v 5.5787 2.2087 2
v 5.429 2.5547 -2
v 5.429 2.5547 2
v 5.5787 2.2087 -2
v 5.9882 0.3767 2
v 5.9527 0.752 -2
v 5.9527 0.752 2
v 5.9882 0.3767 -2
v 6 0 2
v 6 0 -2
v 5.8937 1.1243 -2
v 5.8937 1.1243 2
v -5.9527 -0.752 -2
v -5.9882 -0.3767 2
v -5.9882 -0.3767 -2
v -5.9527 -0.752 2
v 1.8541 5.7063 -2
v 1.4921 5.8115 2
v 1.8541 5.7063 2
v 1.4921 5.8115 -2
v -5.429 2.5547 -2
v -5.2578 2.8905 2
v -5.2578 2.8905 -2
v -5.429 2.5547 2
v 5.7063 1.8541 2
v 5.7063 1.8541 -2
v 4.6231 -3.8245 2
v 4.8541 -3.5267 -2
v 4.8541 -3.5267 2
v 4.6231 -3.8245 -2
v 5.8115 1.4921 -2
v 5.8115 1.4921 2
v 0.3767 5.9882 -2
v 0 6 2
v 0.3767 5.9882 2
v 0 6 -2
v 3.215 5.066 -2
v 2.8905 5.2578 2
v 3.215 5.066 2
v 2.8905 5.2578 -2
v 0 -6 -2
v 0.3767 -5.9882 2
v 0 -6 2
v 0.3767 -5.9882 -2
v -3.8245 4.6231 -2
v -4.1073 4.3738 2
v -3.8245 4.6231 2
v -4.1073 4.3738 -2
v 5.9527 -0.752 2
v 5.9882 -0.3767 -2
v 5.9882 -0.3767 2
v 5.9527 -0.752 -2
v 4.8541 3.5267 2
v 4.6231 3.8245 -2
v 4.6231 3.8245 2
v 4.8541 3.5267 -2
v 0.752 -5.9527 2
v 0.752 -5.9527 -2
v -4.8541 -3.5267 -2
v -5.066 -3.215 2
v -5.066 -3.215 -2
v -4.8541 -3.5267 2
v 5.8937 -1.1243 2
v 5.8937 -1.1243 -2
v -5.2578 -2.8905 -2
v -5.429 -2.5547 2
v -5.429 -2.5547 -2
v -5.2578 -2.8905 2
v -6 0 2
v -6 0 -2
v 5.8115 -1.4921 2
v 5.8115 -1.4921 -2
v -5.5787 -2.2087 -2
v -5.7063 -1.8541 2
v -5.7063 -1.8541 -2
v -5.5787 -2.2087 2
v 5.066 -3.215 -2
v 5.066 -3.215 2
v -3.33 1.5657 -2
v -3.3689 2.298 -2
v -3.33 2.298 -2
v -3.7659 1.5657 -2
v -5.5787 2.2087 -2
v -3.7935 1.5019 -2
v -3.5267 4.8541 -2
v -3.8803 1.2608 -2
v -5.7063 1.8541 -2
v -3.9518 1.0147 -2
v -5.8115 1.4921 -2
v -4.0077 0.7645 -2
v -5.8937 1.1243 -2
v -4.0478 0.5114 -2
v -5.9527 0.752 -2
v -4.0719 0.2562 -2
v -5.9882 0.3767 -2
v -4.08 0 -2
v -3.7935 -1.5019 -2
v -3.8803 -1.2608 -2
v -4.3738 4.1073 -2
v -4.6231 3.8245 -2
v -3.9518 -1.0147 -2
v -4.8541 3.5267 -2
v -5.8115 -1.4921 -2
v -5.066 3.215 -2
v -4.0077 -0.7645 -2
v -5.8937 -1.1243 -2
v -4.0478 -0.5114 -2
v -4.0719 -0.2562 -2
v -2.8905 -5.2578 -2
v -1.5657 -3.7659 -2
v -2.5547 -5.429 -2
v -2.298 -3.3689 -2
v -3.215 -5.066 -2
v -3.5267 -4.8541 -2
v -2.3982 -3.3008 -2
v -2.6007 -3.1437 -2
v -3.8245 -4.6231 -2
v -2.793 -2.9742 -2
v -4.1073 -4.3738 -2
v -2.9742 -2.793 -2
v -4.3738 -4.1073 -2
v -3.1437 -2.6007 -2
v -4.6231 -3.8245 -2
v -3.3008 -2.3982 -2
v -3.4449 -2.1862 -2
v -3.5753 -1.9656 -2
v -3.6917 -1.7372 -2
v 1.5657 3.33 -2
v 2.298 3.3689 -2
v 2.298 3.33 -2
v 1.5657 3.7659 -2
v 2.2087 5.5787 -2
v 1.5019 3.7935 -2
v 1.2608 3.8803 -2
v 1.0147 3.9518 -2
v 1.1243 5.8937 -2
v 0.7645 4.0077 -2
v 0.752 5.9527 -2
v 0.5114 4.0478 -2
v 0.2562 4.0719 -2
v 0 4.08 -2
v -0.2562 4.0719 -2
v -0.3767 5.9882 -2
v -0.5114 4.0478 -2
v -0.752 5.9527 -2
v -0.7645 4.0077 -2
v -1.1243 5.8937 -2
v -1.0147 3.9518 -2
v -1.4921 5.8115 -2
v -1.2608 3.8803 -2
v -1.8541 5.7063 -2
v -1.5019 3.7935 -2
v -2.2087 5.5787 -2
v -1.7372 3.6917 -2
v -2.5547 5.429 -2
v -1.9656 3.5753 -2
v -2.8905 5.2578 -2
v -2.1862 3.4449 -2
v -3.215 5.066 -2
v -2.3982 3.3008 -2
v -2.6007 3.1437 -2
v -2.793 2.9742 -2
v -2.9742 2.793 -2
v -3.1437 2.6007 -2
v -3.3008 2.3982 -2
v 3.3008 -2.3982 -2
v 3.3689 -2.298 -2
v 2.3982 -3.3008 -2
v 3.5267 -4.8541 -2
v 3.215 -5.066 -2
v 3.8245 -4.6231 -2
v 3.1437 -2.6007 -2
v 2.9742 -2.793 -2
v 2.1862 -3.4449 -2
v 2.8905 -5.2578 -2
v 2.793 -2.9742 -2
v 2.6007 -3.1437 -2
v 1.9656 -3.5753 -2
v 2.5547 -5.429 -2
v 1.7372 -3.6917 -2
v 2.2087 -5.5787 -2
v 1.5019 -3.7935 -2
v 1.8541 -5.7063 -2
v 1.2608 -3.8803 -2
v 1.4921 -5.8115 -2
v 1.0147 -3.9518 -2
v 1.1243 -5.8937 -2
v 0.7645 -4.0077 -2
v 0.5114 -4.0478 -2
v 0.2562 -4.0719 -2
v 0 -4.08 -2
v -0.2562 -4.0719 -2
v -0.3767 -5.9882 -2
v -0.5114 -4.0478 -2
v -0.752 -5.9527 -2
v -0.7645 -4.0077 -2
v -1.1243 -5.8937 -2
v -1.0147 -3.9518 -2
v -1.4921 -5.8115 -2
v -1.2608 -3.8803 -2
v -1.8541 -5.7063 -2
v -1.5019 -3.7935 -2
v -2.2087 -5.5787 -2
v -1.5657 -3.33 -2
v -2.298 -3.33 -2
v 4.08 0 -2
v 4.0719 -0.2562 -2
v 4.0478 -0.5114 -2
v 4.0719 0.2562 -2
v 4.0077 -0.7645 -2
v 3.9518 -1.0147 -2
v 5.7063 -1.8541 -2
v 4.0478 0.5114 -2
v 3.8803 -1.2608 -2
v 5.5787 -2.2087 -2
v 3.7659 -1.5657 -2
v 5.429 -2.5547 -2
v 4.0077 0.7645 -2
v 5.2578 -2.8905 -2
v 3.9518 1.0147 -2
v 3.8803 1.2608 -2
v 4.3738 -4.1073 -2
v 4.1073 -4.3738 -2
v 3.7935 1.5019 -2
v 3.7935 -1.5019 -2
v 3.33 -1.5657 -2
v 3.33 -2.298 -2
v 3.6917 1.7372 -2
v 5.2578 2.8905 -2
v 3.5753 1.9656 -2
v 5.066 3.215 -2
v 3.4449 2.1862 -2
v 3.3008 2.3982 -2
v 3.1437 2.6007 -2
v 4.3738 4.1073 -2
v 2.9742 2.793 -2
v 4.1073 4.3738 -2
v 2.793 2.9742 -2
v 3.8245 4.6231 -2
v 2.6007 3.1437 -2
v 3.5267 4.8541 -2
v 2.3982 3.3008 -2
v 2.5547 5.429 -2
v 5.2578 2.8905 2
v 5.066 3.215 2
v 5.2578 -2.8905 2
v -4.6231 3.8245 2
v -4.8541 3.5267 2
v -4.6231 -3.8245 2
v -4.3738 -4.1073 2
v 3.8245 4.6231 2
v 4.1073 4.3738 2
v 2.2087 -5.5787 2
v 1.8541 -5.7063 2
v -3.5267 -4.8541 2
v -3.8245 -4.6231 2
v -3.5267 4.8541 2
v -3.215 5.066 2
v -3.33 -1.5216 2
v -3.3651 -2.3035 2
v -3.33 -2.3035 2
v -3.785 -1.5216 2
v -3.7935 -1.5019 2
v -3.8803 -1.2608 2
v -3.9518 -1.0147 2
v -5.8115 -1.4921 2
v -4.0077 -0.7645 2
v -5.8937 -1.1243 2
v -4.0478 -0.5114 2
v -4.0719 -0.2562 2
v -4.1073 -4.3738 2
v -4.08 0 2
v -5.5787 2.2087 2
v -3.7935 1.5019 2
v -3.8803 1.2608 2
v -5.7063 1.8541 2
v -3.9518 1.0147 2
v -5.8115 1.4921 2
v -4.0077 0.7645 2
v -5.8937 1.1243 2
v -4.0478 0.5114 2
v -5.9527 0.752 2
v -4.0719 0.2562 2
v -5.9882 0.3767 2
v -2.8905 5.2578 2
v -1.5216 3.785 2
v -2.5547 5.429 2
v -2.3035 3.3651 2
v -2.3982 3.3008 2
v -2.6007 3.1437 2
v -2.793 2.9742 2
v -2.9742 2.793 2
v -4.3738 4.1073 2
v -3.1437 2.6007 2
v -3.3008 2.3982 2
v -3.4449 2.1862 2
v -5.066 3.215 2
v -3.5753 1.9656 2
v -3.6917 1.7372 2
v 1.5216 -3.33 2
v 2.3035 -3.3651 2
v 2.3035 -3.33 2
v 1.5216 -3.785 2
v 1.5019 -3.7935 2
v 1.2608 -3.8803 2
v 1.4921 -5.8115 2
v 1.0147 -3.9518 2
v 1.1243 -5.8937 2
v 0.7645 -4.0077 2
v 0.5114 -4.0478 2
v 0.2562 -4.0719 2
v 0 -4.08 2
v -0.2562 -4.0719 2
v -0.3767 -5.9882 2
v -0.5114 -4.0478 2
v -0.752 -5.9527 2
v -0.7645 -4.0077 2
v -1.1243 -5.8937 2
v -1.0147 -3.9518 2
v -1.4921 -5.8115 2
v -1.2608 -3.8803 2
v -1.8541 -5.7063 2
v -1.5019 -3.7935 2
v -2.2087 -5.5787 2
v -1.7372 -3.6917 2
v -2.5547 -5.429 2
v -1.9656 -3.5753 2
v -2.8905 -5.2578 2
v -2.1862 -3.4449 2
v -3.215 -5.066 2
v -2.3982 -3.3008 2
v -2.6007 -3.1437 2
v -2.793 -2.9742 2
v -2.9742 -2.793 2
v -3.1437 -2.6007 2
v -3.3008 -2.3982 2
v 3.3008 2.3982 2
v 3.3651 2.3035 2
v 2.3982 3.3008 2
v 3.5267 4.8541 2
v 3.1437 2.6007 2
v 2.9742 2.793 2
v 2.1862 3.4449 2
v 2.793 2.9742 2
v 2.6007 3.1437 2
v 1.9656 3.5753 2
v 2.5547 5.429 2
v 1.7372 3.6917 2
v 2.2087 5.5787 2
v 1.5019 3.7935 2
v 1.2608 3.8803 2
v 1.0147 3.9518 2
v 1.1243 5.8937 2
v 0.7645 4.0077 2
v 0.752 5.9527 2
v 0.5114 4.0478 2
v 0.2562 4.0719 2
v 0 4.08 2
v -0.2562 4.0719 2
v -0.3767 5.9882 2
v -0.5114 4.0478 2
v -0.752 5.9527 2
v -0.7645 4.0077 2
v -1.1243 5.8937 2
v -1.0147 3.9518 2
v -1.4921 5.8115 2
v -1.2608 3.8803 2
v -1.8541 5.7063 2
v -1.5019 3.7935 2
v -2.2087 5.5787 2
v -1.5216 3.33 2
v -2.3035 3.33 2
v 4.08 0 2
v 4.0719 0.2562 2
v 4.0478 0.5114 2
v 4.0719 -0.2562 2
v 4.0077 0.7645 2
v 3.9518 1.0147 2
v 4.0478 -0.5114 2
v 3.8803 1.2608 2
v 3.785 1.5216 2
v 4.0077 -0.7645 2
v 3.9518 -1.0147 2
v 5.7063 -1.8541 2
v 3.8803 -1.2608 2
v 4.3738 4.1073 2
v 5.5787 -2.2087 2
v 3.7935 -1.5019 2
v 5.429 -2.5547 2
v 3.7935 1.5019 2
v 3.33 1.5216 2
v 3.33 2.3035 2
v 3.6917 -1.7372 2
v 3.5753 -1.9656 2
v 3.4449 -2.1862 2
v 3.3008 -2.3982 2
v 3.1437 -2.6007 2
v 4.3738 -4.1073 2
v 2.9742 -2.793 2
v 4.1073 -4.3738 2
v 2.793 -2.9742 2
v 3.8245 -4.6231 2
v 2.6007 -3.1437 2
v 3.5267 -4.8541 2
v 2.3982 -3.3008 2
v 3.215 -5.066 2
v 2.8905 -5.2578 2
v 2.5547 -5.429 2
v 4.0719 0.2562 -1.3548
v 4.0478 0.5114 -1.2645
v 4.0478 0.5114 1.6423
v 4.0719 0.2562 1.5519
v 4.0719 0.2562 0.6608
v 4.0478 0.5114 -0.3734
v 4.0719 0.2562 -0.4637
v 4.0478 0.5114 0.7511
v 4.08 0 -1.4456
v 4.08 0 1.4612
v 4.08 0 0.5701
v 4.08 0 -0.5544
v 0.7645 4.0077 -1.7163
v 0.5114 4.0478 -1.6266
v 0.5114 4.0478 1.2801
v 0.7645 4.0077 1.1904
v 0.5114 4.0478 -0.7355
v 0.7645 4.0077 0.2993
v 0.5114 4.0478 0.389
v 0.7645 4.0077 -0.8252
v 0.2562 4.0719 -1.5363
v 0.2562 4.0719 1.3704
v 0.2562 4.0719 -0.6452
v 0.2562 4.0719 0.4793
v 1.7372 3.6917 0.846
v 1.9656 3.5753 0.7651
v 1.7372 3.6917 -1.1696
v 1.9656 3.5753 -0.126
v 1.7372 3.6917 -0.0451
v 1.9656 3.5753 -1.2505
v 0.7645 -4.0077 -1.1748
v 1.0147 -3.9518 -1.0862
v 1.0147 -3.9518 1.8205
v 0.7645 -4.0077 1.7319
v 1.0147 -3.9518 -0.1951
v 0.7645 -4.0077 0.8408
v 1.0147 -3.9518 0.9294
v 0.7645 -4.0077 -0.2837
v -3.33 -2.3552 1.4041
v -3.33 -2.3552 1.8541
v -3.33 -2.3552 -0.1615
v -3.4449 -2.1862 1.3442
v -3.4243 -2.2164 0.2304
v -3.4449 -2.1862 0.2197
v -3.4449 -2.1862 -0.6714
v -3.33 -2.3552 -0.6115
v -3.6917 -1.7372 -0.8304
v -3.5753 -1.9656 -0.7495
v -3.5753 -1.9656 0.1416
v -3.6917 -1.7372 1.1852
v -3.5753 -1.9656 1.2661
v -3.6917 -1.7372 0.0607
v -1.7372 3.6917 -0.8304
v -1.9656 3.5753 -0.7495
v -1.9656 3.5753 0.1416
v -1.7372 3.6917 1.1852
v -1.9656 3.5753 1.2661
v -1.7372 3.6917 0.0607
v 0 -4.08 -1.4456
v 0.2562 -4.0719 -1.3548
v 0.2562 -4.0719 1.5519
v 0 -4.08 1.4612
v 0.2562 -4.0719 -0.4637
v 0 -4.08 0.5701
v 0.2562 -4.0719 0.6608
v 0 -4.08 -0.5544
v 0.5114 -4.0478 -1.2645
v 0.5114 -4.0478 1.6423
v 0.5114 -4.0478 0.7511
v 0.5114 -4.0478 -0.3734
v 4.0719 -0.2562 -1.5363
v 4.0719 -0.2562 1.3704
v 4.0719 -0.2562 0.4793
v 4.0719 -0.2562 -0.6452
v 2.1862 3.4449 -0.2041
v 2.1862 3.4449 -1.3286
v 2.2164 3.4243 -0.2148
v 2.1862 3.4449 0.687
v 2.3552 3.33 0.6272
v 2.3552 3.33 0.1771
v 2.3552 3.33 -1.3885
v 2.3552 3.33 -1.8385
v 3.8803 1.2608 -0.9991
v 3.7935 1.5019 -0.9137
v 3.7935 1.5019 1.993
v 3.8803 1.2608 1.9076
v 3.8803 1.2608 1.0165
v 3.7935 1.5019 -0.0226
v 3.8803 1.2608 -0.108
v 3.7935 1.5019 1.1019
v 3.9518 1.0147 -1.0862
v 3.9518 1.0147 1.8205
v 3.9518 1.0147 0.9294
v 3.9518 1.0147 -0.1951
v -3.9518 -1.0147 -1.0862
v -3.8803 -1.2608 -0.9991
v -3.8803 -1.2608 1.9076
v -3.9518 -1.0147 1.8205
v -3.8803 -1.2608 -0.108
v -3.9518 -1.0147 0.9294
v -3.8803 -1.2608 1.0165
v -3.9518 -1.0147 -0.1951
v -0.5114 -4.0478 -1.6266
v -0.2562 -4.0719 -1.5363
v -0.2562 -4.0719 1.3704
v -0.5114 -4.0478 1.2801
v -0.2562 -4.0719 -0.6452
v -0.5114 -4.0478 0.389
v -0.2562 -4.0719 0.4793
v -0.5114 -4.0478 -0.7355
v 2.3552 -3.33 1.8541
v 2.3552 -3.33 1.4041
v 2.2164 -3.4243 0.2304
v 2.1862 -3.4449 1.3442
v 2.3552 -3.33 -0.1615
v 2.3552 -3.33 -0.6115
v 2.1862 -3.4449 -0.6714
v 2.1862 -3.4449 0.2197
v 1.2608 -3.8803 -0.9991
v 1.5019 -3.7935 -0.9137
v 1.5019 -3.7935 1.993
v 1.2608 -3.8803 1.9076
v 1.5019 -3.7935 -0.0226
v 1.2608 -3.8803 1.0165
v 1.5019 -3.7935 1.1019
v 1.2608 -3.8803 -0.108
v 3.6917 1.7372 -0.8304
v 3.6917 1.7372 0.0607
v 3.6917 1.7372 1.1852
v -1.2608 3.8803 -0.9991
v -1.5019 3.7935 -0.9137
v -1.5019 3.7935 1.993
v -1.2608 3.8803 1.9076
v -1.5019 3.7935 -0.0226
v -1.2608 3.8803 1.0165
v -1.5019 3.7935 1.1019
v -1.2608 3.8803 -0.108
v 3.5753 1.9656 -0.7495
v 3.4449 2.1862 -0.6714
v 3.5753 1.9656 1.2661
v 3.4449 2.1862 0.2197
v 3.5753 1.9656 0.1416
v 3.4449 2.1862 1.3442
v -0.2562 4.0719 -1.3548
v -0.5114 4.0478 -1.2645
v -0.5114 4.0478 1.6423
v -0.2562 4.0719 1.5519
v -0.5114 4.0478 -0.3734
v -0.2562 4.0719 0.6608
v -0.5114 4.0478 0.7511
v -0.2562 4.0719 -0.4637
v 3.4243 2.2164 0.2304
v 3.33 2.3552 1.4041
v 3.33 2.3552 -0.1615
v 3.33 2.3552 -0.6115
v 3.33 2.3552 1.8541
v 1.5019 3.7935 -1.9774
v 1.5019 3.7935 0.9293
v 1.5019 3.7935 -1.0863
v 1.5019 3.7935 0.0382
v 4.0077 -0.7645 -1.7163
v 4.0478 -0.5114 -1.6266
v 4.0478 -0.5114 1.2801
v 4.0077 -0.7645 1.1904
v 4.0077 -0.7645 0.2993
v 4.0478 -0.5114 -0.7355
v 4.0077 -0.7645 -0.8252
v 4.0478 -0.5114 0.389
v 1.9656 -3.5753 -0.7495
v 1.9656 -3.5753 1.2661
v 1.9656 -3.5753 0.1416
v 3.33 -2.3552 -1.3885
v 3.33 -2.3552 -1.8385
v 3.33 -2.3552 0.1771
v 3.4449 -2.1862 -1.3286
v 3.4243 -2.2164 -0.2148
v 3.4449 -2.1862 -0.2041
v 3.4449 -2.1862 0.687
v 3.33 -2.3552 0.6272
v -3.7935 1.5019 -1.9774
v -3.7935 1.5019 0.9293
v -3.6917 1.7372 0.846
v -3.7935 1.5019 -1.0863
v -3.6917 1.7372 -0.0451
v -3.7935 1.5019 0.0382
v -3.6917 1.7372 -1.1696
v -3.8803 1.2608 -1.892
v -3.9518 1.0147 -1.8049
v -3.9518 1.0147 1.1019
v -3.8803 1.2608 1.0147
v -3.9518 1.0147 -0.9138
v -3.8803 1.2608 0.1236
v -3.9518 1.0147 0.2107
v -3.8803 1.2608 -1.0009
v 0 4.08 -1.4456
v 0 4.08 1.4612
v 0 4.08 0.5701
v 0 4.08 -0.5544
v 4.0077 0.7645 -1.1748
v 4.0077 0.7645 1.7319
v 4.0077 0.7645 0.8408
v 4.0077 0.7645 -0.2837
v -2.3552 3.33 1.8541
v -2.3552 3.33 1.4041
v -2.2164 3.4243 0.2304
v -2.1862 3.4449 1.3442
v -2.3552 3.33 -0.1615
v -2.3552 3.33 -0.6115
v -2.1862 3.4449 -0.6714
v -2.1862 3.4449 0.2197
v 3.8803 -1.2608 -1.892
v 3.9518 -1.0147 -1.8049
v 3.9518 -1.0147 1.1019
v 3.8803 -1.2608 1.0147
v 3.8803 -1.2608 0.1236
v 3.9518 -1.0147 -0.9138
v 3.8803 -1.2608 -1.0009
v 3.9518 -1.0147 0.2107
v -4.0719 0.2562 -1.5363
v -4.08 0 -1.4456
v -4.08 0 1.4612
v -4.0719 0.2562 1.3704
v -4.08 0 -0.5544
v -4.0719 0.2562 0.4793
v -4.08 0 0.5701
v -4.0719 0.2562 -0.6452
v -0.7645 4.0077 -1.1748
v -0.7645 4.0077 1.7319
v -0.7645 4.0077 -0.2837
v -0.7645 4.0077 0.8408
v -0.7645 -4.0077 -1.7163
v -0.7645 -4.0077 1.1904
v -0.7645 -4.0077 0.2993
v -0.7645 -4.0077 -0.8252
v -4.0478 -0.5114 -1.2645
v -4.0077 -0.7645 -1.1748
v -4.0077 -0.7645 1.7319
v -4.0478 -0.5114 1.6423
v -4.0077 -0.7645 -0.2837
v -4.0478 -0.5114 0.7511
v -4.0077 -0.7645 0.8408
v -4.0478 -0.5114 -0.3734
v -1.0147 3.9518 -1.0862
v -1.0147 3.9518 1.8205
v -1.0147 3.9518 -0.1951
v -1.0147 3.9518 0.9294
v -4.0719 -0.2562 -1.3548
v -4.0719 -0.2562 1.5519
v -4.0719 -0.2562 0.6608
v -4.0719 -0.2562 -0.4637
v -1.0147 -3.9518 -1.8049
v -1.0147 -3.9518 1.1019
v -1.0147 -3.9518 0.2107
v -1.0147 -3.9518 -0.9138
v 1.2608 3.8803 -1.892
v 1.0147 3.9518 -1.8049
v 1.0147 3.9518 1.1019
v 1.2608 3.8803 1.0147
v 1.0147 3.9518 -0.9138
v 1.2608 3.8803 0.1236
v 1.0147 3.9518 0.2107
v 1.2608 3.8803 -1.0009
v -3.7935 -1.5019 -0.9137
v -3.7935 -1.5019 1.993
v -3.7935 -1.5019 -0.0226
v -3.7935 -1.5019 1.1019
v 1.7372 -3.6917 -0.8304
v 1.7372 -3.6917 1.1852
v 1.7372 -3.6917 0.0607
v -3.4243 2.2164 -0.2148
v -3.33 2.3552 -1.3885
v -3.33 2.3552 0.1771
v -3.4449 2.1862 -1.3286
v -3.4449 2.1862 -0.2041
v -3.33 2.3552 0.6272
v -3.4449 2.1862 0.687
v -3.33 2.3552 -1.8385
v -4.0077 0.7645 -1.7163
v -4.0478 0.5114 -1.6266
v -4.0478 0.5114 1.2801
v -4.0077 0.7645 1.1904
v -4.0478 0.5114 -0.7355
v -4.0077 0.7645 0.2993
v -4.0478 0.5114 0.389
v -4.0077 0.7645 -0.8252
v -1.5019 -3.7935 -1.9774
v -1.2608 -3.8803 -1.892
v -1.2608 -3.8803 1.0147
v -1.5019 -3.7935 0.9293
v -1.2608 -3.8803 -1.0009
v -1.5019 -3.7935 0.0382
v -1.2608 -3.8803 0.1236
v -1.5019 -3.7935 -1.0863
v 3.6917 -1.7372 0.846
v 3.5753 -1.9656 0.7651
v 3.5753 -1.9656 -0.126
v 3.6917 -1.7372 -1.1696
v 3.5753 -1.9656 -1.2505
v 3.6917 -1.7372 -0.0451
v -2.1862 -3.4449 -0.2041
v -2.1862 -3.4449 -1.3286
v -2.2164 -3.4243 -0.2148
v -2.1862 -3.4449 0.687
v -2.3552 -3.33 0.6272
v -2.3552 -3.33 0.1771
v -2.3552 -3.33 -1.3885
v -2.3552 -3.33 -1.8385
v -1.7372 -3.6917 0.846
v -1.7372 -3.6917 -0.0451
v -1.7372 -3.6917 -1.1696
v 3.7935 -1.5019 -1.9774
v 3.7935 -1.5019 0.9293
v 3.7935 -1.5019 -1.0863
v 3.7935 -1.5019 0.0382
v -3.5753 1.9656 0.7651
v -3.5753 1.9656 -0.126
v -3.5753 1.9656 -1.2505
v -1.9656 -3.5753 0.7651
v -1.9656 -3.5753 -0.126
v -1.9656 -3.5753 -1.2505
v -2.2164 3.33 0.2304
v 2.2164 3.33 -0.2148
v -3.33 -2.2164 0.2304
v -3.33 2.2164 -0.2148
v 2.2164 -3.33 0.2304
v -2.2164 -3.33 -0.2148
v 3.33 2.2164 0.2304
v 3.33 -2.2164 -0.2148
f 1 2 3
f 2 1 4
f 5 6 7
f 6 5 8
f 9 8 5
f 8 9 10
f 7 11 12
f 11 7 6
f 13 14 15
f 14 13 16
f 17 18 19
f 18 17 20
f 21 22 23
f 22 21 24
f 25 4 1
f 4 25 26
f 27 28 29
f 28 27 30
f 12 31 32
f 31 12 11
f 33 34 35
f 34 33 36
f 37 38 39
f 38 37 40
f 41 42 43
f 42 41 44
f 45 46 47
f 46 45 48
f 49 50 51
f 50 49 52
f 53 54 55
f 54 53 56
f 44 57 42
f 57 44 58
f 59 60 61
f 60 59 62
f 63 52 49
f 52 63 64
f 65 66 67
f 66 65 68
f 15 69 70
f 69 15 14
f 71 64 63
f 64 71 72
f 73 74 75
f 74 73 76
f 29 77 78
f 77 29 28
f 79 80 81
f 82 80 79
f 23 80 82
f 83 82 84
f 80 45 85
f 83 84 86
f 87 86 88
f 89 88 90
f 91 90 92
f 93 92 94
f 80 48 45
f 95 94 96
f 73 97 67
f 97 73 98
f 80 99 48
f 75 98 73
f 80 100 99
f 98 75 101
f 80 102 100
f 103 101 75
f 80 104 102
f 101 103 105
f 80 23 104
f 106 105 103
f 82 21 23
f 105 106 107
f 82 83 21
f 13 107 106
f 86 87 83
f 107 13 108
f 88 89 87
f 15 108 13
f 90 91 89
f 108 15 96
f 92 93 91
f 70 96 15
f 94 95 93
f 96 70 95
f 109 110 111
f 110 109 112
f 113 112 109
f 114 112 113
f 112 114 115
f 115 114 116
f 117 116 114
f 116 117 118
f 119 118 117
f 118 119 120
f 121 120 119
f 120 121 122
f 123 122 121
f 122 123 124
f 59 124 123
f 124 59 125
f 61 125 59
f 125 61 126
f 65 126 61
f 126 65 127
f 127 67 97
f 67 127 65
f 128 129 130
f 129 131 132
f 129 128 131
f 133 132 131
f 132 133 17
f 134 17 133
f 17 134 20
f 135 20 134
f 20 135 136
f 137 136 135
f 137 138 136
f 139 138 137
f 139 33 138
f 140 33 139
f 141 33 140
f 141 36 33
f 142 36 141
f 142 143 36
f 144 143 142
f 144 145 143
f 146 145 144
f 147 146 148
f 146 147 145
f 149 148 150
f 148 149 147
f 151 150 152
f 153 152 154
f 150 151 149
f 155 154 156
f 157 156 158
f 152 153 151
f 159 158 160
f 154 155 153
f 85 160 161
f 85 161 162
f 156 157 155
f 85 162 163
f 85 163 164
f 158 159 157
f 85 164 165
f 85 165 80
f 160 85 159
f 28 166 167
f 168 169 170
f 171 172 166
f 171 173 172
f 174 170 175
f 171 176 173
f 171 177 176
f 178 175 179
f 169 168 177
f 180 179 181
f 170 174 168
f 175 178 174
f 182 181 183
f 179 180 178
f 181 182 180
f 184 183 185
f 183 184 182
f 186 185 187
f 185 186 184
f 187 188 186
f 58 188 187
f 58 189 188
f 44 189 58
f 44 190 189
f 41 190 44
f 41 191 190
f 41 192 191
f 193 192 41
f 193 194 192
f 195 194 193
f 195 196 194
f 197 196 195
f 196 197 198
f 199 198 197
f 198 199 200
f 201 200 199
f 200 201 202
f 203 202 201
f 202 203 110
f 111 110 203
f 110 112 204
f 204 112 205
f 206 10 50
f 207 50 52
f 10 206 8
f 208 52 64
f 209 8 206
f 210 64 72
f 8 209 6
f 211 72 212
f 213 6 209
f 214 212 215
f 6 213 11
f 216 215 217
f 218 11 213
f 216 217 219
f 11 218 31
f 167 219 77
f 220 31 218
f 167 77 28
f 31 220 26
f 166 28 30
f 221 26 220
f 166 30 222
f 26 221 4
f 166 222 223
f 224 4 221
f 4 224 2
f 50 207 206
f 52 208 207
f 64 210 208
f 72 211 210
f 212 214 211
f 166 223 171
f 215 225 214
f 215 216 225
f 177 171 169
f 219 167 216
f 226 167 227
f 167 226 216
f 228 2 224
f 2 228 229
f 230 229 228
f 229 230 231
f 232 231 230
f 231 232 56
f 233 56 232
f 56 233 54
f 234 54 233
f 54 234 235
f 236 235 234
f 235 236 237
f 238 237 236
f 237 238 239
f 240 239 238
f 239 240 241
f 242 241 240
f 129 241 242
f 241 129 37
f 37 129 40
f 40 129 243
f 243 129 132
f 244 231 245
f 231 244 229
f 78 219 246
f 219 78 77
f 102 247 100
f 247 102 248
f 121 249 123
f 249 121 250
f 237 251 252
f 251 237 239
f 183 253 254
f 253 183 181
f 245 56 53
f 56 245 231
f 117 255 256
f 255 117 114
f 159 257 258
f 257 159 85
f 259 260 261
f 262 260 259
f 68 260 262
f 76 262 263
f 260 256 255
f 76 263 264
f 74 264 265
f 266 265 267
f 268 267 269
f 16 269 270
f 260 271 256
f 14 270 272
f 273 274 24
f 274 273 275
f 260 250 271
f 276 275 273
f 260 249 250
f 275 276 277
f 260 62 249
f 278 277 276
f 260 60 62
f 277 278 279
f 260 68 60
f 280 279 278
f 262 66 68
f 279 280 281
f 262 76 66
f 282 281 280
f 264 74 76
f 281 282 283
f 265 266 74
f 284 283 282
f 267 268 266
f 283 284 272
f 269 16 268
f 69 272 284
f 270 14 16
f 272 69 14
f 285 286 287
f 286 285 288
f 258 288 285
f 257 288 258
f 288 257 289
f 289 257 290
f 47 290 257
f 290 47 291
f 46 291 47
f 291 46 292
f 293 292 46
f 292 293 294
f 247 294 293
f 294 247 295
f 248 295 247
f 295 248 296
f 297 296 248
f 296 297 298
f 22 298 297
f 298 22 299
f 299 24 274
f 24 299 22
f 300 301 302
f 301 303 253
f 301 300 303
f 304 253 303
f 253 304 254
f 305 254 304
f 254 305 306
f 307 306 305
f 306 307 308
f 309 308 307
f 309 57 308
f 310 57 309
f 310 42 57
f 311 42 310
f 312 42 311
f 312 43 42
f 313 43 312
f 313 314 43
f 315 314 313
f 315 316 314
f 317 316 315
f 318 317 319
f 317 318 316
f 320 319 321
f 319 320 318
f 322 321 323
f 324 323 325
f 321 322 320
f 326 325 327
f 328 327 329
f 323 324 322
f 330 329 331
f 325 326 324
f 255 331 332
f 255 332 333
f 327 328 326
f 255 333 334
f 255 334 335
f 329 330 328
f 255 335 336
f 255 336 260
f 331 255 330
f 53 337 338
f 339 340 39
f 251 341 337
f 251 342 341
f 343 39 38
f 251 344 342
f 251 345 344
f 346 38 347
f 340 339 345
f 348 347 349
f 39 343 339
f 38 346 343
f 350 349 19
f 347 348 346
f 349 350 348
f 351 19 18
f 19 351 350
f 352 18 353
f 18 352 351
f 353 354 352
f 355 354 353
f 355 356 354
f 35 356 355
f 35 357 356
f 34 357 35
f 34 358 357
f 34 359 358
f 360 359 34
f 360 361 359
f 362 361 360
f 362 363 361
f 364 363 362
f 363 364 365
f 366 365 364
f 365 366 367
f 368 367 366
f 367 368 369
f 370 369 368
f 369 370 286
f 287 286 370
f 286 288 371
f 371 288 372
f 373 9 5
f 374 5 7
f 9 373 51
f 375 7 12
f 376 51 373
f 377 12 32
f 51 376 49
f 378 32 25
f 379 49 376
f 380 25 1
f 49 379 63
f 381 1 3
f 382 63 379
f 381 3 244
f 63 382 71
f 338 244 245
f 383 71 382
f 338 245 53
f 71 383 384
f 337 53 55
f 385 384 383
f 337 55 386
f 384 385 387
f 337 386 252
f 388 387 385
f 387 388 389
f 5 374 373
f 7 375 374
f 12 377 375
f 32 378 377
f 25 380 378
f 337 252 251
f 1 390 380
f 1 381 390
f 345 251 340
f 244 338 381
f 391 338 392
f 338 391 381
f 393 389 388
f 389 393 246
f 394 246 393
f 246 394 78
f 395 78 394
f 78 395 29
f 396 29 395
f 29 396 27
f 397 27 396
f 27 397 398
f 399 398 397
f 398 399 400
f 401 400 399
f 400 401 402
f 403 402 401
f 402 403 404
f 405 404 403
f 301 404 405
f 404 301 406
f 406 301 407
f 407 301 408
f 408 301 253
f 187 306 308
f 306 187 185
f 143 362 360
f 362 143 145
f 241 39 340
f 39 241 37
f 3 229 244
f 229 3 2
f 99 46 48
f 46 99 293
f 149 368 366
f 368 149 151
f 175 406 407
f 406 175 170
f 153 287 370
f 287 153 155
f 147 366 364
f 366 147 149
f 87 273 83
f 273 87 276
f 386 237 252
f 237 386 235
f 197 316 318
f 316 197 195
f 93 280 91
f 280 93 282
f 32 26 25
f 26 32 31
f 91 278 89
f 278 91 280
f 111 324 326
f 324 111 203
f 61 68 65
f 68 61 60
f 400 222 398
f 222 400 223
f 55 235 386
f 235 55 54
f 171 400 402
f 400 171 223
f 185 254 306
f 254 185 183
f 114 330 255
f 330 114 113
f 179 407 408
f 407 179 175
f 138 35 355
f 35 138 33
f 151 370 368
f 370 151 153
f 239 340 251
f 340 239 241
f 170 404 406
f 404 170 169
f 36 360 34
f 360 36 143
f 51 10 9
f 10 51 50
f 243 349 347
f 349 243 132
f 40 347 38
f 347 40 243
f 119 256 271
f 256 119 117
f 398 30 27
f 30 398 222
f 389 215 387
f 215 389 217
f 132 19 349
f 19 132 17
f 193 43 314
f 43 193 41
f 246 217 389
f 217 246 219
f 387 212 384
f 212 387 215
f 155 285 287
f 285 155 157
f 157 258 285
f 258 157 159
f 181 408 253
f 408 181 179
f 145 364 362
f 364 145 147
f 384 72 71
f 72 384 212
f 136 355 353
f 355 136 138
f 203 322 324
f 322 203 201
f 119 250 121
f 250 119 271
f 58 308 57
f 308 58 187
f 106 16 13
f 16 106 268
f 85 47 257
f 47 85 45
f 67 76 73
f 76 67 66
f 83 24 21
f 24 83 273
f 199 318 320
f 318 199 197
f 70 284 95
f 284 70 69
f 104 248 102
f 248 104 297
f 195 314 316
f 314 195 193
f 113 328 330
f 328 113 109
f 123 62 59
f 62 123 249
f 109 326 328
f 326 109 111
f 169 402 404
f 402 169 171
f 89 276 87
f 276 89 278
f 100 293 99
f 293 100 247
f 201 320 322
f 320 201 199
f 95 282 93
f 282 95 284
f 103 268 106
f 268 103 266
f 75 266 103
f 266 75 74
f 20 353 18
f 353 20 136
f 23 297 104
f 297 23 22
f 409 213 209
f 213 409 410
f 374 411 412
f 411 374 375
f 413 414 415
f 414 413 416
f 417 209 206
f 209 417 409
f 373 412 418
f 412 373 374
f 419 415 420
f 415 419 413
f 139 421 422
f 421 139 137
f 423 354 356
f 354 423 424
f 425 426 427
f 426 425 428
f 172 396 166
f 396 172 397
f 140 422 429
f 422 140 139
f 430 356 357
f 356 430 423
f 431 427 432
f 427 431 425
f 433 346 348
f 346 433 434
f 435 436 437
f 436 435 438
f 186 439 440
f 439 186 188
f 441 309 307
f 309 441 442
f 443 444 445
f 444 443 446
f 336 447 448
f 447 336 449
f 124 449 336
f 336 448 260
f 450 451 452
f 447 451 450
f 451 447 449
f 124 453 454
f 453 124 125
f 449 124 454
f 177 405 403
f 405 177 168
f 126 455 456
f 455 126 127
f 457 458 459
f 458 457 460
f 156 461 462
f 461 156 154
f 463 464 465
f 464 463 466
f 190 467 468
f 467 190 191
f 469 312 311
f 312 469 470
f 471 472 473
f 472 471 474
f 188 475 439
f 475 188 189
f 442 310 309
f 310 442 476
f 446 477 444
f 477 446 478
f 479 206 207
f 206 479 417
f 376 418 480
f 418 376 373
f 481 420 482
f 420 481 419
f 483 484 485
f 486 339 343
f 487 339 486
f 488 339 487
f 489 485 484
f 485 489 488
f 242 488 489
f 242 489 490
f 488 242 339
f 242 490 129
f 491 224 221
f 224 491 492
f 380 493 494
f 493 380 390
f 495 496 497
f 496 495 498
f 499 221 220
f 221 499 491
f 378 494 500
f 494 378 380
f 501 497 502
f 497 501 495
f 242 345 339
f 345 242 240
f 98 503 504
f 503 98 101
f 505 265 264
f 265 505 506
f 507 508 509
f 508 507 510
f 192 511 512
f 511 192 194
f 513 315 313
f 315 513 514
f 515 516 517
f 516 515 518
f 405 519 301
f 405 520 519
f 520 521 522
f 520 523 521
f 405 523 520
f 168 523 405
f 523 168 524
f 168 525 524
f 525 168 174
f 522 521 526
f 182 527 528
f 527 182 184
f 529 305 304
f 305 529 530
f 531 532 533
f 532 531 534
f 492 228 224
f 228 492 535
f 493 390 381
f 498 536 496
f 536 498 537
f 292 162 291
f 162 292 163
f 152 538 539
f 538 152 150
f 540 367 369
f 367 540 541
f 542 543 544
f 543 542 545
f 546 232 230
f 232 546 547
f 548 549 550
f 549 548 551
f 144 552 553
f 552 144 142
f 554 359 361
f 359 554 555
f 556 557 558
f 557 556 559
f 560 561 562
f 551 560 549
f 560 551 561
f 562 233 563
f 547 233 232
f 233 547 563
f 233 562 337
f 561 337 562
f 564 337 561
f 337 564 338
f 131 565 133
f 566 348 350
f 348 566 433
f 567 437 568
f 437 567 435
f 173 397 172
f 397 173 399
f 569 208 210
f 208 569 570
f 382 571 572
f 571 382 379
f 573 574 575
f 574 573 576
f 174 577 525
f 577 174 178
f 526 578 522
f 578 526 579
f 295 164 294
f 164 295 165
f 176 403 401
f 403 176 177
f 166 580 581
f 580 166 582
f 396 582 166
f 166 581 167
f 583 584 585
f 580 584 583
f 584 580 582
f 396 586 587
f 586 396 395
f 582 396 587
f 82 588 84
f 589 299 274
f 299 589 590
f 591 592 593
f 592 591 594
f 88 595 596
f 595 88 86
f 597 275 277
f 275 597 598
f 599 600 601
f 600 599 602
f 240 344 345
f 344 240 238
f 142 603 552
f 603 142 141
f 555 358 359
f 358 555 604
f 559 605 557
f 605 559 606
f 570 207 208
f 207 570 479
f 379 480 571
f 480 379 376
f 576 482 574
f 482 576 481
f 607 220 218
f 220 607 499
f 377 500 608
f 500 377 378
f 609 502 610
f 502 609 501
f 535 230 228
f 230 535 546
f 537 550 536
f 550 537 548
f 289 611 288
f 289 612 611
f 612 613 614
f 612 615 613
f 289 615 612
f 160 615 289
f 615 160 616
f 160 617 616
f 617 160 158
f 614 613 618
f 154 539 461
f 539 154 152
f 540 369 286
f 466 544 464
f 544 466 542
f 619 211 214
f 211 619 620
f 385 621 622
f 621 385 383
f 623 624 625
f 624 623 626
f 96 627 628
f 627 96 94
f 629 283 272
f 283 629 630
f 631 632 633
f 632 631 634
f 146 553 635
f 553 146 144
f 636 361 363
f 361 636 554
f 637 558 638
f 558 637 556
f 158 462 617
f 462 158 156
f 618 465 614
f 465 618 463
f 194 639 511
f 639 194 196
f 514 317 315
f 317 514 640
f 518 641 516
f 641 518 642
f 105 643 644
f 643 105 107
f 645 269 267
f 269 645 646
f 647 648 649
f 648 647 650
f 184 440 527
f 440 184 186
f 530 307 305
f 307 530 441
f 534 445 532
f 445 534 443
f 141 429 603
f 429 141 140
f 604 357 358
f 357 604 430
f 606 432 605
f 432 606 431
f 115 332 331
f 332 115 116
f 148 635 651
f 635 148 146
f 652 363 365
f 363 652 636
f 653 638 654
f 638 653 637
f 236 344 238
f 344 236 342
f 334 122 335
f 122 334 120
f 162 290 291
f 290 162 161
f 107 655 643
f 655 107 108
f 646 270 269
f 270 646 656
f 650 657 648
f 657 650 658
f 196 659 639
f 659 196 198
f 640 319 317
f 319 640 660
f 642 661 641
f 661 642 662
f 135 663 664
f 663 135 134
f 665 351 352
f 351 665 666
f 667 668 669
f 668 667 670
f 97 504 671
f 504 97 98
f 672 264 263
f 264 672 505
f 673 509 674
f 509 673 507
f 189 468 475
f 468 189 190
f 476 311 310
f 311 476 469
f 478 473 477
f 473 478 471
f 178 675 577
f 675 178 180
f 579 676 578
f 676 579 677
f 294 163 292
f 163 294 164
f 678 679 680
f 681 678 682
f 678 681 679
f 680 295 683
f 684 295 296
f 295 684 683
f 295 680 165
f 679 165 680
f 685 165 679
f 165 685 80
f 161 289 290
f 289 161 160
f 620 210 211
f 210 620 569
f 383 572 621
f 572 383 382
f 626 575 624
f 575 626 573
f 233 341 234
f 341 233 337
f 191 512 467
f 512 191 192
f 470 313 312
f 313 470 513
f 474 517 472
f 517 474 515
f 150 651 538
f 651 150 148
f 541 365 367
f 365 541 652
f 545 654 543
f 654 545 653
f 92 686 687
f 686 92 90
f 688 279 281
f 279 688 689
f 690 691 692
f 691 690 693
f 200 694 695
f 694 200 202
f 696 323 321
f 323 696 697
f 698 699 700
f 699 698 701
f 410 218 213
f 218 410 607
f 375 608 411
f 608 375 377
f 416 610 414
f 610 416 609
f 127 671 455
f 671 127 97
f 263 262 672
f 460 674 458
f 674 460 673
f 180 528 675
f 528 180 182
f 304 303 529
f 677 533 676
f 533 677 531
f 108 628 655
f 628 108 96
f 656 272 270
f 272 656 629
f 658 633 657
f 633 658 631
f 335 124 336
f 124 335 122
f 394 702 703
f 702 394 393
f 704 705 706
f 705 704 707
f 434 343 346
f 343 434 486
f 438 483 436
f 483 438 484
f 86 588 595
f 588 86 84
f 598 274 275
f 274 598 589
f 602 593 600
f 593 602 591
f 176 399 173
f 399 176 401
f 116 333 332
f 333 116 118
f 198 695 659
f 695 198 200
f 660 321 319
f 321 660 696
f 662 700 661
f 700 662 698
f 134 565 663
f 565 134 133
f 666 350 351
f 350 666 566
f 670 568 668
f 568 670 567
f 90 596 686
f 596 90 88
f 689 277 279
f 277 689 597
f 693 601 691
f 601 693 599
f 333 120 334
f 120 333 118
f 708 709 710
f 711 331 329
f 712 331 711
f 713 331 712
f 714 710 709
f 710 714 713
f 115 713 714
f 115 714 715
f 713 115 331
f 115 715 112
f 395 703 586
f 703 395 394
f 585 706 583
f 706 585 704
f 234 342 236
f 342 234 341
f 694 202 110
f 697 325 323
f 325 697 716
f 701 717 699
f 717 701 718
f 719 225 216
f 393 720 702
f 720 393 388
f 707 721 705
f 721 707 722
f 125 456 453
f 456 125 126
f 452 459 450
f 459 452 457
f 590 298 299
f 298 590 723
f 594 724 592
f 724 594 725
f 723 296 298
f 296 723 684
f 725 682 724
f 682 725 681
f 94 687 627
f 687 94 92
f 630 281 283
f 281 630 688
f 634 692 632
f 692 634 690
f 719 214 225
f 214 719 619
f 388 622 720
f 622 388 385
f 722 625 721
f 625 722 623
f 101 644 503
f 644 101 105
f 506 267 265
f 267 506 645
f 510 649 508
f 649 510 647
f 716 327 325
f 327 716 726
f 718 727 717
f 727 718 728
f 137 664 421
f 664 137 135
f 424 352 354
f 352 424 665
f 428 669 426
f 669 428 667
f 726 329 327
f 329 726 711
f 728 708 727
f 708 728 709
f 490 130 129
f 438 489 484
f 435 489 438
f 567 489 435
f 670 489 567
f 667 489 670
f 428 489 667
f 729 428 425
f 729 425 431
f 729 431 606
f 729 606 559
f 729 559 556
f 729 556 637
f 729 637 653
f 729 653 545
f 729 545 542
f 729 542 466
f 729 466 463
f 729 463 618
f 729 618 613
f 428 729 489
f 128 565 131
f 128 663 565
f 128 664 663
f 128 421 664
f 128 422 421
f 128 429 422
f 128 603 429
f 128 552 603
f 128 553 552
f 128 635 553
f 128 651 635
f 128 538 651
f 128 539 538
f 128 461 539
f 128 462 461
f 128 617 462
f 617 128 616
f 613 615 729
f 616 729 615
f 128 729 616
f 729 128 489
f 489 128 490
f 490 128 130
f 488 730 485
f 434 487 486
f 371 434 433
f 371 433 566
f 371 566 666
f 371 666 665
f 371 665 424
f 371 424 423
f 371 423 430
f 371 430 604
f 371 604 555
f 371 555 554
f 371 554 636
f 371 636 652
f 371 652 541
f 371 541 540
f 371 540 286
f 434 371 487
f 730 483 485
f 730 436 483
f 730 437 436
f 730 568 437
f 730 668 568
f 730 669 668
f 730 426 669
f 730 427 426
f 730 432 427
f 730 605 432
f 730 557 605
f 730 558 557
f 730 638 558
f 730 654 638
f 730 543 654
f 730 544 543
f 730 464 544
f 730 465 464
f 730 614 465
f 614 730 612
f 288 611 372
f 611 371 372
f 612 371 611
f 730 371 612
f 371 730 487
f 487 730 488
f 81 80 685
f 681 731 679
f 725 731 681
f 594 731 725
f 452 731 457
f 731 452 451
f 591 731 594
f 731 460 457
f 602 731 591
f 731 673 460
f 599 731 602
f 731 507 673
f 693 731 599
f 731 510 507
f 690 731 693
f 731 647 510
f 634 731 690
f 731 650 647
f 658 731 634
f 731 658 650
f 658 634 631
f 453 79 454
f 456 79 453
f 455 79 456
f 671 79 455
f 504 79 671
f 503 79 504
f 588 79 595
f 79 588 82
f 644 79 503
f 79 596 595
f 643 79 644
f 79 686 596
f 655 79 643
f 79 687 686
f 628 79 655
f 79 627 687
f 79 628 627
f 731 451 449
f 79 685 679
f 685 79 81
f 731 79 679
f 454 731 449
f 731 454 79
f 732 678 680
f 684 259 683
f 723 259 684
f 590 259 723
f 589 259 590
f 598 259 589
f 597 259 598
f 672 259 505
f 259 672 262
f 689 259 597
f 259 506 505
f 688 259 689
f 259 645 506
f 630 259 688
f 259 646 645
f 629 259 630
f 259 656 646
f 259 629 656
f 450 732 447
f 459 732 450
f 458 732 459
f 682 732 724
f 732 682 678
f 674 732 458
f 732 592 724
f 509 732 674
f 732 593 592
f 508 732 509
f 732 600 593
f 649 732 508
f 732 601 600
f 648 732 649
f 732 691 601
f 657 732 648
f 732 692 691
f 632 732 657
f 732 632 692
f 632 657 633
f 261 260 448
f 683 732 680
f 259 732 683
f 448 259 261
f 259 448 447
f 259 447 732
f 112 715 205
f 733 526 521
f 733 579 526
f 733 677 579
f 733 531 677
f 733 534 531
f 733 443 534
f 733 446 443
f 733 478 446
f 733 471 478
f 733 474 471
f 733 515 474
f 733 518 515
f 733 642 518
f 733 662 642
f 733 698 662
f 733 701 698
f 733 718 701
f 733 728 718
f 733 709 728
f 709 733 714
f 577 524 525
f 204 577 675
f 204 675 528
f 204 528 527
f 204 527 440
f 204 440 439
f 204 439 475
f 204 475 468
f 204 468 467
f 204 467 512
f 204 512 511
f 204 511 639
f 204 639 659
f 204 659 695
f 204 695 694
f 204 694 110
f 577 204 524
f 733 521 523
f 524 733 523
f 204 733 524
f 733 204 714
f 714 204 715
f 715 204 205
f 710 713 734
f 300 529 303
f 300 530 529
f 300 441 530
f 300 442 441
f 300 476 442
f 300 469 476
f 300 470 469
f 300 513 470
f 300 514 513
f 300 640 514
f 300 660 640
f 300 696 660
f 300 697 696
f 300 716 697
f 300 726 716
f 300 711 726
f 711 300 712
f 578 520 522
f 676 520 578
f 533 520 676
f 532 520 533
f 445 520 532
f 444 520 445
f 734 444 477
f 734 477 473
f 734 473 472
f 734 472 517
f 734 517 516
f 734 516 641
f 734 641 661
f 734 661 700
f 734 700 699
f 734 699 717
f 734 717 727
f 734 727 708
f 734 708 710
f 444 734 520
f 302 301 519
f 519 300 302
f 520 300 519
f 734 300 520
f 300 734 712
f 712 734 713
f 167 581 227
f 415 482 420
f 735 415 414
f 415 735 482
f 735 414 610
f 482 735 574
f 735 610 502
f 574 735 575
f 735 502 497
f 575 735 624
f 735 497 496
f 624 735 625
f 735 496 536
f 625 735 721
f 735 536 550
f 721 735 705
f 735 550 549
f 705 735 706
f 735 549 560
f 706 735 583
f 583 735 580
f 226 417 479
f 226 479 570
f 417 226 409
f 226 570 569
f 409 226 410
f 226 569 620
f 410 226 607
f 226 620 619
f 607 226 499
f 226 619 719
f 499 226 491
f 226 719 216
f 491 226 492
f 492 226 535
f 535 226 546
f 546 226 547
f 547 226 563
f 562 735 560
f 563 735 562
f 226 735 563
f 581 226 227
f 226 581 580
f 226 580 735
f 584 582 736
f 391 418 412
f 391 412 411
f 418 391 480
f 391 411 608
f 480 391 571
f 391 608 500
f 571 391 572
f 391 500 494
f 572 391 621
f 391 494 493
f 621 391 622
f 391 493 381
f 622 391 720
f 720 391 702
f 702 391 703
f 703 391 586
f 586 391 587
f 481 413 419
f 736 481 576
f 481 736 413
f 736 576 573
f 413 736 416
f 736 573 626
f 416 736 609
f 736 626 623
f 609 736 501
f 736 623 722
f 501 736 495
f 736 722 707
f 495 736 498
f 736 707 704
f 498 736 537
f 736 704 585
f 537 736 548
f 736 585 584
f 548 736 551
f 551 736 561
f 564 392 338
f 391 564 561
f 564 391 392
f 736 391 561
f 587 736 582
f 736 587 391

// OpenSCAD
module grooves(t1, t2, angle, length, width, depth){
    for(i=[0:length]){
        let(dz=(t1+t2)/(sin(90-angle)),x=0,y=0,z=0)
        let()
        translate([x,y,z+dz*i])rotate([0,angle,0])cube([width,depth,t1],center=true);
    }
    
}


module ring(r1,r2,h){
    difference(){
    cylinder(r=r1,h=h, $fn=100,center=true);
        cylinder(r=r2,h=h*2, $fn=100,center=true);
    }
}

difference(){
    union(){
        ring(6,4.08,4);
        for(i=[0:3])
            rotate([0,0,90*i])
        let(x=0,y=4.08,z=-1)
        
        translate([x,y,z])grooves(0.84, 1.06, 19.5, length=1, width=5, depth=1+0.5);
    }
    let(x=0,y=0,z=2.5)
    translate([x,y,z])cube([100,100,1],center=true);
    let(x=0,y=0,z=-2.5)
    translate([x,y,z])cube([100,100,1],center=true);
    
}
//translate([-2.5,+0.2,-5])cube([5,0.5,30]);
